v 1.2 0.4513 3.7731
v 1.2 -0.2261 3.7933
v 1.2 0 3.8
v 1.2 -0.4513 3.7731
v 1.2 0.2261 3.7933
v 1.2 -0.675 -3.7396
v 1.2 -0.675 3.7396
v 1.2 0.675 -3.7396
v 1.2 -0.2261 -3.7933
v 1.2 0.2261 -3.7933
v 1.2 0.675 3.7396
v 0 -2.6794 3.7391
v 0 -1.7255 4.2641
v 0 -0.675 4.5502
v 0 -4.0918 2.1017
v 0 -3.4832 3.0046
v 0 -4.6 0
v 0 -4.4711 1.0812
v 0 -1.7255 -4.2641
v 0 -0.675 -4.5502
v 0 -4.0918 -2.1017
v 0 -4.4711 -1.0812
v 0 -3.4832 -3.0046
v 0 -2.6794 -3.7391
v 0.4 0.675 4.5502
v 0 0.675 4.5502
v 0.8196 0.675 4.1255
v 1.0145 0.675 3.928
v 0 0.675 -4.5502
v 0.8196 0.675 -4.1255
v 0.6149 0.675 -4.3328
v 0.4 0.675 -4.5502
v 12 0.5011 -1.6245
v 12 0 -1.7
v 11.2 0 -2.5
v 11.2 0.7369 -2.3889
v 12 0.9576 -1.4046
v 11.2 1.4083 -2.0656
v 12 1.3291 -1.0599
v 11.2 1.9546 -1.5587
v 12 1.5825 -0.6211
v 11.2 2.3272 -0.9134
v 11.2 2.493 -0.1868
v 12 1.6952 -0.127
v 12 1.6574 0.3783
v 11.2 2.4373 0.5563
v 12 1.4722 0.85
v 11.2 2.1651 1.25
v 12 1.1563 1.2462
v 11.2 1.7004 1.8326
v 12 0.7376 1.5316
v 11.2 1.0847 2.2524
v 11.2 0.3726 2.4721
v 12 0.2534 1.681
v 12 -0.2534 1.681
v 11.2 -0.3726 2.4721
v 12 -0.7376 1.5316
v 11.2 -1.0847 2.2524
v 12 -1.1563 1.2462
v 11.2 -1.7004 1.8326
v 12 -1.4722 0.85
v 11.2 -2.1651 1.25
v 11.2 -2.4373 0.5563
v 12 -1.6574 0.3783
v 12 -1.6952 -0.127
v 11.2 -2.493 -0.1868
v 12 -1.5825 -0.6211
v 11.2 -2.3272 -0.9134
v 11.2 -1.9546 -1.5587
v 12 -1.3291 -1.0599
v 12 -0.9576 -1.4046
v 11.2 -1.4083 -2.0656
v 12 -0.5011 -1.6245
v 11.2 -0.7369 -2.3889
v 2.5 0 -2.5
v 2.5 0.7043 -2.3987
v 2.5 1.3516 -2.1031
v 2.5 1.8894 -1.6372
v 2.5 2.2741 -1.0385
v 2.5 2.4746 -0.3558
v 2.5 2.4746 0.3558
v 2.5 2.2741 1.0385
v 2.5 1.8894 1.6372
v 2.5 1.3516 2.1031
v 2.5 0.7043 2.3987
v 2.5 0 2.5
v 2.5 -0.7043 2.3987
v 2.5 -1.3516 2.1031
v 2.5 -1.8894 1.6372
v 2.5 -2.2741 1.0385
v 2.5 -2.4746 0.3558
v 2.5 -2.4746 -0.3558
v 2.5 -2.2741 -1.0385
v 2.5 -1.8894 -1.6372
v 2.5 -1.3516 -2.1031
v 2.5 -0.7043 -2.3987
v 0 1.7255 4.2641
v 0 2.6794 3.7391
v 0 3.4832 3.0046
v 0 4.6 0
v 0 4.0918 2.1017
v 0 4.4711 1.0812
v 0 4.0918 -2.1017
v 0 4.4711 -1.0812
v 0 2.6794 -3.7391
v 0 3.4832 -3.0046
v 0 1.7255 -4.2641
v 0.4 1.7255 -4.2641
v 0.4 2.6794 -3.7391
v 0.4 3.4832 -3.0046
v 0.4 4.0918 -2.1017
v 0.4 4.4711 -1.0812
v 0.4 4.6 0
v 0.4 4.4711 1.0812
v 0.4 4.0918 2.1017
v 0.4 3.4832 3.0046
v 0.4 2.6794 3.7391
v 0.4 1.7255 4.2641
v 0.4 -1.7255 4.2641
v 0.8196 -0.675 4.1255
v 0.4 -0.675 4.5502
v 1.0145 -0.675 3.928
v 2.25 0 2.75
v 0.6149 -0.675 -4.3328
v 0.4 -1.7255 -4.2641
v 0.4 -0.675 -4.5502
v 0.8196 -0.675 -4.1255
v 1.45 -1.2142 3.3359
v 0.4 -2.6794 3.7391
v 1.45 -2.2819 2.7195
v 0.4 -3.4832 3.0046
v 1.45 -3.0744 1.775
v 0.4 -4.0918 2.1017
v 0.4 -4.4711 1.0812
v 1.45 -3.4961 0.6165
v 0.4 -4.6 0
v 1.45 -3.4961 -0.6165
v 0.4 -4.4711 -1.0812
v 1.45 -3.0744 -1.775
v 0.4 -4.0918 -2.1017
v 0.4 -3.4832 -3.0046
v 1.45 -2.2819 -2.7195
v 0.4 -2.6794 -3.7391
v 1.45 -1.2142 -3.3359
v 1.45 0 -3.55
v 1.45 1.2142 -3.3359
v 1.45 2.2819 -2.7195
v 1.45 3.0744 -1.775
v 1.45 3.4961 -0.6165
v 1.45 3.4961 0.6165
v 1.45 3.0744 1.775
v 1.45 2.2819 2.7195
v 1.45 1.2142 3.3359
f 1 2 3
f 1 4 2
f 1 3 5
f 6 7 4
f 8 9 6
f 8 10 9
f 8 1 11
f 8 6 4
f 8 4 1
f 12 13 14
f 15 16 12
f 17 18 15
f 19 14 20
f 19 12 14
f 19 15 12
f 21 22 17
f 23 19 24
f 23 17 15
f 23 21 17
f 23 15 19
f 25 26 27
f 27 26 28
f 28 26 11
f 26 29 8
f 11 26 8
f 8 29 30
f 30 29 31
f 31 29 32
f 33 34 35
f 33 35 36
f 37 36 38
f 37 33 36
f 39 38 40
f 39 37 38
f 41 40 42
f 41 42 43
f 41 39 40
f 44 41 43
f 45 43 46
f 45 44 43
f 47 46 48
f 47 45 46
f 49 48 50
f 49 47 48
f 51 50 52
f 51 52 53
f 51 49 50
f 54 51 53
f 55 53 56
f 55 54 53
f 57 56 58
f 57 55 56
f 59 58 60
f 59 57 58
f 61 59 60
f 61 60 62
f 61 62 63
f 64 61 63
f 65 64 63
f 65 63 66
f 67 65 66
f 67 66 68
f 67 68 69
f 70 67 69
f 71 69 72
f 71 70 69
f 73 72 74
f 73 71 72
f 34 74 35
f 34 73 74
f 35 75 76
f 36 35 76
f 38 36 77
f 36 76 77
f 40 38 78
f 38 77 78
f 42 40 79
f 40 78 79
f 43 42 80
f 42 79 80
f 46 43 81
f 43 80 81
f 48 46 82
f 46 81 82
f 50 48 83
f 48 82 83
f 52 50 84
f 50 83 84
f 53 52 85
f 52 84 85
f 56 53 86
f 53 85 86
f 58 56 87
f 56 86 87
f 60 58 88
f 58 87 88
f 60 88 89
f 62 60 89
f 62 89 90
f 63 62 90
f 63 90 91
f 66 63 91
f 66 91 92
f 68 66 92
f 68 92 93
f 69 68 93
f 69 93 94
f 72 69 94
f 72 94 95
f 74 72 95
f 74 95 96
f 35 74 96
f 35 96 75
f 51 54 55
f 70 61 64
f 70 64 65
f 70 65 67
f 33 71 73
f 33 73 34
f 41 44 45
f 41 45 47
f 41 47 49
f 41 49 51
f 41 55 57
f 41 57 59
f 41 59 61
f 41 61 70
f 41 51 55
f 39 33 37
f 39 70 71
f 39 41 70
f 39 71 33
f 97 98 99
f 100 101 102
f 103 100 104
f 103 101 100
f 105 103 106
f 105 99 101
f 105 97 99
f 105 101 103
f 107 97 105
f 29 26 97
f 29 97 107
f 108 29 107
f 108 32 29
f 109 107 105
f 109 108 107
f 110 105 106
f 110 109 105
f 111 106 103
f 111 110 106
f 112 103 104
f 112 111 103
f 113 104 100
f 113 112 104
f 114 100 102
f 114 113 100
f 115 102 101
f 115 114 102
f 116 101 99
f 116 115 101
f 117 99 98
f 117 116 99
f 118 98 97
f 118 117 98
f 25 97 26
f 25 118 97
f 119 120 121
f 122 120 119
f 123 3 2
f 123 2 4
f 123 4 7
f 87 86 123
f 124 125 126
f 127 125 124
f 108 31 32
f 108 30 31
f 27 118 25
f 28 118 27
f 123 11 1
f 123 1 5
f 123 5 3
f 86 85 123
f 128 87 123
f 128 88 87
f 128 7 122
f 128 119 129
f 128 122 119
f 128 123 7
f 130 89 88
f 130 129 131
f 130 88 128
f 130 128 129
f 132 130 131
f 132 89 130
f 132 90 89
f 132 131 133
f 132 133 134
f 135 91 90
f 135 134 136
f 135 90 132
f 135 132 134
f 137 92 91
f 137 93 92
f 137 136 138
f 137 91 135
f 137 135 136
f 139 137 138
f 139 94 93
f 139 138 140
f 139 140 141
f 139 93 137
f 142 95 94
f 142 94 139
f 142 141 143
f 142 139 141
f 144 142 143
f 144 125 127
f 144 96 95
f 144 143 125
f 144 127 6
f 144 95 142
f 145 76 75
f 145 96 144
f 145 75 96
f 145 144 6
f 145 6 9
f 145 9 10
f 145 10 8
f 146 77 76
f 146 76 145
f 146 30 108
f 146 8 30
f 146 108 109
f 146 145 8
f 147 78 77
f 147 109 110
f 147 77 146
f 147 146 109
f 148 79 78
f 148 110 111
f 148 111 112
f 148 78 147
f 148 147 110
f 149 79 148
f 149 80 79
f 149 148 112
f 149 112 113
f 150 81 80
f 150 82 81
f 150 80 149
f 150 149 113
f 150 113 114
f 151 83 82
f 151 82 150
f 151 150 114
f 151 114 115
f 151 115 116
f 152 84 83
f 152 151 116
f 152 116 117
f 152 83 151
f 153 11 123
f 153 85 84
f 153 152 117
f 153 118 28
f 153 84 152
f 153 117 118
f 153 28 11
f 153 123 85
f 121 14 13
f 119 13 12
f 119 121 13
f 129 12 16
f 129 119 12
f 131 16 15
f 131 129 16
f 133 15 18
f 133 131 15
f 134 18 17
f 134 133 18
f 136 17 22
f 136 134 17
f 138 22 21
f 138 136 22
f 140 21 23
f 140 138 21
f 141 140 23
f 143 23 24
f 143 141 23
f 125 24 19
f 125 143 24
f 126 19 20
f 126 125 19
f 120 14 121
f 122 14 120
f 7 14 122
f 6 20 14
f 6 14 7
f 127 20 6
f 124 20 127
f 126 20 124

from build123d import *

# Parameters (mm, degrees)
SKETCH_1_R               = 2.5
EXTRUDE_654_DEPTH        = 12
CHAMFER_1_SIZE           = 0.8
CUT_EXTRUDE_1_DEPTH      = 14.649908425
CUT_EXTRUDE_1_DEPTH_BACK = 14.649908425
SKETCH_4_W               = 1.2
SKETCH_4_H               = 1.35


with BuildPart() as part:
    # Эскиз1 → Extrude 654 (new body)
    with BuildSketch(Plane(origin=(0, 0, 0), x_dir=(0, 0, -1), z_dir=(1, 0, 0))):
        Circle(SKETCH_1_R)
    extrude(amount=EXTRUDE_654_DEPTH)

    # Фаска1
    chamfer_1_edges = [part.edges().sort_by_distance(p)[0] for p in [
        (12, 0, 2.5),
    ]]
    chamfer(chamfer_1_edges, length=CHAMFER_1_SIZE)

    # Эскиз2 → Бобышка-Повернуть1 (revolve)
    with BuildSketch(Plane.XY, mode=Mode.PRIVATE) as revolve_1_sk:
        Polygon((0, 4.6), (0.4, 4.6), (2.5, 2.5), (2.5, 0), (0, 0), align=None)
    revolve(revolve_1_sk.sketch.rotate(Axis((0, 0, 0), (1, 0, 0)), 90), axis=Axis((0, 0, 0), (1, 0, 0)))

    # Эскиз4 → Вырез-Вытянуть1 (cut, two sides: drawn at the far end of the back side and taken through both)
    with BuildSketch(Plane.XY.offset(-CUT_EXTRUDE_1_DEPTH_BACK)):
        with Locations((0.6, 0)):
            Rectangle(SKETCH_4_W, SKETCH_4_H)
    extrude(amount=CUT_EXTRUDE_1_DEPTH + CUT_EXTRUDE_1_DEPTH_BACK, mode=Mode.SUBTRACT)


solid = part.part
